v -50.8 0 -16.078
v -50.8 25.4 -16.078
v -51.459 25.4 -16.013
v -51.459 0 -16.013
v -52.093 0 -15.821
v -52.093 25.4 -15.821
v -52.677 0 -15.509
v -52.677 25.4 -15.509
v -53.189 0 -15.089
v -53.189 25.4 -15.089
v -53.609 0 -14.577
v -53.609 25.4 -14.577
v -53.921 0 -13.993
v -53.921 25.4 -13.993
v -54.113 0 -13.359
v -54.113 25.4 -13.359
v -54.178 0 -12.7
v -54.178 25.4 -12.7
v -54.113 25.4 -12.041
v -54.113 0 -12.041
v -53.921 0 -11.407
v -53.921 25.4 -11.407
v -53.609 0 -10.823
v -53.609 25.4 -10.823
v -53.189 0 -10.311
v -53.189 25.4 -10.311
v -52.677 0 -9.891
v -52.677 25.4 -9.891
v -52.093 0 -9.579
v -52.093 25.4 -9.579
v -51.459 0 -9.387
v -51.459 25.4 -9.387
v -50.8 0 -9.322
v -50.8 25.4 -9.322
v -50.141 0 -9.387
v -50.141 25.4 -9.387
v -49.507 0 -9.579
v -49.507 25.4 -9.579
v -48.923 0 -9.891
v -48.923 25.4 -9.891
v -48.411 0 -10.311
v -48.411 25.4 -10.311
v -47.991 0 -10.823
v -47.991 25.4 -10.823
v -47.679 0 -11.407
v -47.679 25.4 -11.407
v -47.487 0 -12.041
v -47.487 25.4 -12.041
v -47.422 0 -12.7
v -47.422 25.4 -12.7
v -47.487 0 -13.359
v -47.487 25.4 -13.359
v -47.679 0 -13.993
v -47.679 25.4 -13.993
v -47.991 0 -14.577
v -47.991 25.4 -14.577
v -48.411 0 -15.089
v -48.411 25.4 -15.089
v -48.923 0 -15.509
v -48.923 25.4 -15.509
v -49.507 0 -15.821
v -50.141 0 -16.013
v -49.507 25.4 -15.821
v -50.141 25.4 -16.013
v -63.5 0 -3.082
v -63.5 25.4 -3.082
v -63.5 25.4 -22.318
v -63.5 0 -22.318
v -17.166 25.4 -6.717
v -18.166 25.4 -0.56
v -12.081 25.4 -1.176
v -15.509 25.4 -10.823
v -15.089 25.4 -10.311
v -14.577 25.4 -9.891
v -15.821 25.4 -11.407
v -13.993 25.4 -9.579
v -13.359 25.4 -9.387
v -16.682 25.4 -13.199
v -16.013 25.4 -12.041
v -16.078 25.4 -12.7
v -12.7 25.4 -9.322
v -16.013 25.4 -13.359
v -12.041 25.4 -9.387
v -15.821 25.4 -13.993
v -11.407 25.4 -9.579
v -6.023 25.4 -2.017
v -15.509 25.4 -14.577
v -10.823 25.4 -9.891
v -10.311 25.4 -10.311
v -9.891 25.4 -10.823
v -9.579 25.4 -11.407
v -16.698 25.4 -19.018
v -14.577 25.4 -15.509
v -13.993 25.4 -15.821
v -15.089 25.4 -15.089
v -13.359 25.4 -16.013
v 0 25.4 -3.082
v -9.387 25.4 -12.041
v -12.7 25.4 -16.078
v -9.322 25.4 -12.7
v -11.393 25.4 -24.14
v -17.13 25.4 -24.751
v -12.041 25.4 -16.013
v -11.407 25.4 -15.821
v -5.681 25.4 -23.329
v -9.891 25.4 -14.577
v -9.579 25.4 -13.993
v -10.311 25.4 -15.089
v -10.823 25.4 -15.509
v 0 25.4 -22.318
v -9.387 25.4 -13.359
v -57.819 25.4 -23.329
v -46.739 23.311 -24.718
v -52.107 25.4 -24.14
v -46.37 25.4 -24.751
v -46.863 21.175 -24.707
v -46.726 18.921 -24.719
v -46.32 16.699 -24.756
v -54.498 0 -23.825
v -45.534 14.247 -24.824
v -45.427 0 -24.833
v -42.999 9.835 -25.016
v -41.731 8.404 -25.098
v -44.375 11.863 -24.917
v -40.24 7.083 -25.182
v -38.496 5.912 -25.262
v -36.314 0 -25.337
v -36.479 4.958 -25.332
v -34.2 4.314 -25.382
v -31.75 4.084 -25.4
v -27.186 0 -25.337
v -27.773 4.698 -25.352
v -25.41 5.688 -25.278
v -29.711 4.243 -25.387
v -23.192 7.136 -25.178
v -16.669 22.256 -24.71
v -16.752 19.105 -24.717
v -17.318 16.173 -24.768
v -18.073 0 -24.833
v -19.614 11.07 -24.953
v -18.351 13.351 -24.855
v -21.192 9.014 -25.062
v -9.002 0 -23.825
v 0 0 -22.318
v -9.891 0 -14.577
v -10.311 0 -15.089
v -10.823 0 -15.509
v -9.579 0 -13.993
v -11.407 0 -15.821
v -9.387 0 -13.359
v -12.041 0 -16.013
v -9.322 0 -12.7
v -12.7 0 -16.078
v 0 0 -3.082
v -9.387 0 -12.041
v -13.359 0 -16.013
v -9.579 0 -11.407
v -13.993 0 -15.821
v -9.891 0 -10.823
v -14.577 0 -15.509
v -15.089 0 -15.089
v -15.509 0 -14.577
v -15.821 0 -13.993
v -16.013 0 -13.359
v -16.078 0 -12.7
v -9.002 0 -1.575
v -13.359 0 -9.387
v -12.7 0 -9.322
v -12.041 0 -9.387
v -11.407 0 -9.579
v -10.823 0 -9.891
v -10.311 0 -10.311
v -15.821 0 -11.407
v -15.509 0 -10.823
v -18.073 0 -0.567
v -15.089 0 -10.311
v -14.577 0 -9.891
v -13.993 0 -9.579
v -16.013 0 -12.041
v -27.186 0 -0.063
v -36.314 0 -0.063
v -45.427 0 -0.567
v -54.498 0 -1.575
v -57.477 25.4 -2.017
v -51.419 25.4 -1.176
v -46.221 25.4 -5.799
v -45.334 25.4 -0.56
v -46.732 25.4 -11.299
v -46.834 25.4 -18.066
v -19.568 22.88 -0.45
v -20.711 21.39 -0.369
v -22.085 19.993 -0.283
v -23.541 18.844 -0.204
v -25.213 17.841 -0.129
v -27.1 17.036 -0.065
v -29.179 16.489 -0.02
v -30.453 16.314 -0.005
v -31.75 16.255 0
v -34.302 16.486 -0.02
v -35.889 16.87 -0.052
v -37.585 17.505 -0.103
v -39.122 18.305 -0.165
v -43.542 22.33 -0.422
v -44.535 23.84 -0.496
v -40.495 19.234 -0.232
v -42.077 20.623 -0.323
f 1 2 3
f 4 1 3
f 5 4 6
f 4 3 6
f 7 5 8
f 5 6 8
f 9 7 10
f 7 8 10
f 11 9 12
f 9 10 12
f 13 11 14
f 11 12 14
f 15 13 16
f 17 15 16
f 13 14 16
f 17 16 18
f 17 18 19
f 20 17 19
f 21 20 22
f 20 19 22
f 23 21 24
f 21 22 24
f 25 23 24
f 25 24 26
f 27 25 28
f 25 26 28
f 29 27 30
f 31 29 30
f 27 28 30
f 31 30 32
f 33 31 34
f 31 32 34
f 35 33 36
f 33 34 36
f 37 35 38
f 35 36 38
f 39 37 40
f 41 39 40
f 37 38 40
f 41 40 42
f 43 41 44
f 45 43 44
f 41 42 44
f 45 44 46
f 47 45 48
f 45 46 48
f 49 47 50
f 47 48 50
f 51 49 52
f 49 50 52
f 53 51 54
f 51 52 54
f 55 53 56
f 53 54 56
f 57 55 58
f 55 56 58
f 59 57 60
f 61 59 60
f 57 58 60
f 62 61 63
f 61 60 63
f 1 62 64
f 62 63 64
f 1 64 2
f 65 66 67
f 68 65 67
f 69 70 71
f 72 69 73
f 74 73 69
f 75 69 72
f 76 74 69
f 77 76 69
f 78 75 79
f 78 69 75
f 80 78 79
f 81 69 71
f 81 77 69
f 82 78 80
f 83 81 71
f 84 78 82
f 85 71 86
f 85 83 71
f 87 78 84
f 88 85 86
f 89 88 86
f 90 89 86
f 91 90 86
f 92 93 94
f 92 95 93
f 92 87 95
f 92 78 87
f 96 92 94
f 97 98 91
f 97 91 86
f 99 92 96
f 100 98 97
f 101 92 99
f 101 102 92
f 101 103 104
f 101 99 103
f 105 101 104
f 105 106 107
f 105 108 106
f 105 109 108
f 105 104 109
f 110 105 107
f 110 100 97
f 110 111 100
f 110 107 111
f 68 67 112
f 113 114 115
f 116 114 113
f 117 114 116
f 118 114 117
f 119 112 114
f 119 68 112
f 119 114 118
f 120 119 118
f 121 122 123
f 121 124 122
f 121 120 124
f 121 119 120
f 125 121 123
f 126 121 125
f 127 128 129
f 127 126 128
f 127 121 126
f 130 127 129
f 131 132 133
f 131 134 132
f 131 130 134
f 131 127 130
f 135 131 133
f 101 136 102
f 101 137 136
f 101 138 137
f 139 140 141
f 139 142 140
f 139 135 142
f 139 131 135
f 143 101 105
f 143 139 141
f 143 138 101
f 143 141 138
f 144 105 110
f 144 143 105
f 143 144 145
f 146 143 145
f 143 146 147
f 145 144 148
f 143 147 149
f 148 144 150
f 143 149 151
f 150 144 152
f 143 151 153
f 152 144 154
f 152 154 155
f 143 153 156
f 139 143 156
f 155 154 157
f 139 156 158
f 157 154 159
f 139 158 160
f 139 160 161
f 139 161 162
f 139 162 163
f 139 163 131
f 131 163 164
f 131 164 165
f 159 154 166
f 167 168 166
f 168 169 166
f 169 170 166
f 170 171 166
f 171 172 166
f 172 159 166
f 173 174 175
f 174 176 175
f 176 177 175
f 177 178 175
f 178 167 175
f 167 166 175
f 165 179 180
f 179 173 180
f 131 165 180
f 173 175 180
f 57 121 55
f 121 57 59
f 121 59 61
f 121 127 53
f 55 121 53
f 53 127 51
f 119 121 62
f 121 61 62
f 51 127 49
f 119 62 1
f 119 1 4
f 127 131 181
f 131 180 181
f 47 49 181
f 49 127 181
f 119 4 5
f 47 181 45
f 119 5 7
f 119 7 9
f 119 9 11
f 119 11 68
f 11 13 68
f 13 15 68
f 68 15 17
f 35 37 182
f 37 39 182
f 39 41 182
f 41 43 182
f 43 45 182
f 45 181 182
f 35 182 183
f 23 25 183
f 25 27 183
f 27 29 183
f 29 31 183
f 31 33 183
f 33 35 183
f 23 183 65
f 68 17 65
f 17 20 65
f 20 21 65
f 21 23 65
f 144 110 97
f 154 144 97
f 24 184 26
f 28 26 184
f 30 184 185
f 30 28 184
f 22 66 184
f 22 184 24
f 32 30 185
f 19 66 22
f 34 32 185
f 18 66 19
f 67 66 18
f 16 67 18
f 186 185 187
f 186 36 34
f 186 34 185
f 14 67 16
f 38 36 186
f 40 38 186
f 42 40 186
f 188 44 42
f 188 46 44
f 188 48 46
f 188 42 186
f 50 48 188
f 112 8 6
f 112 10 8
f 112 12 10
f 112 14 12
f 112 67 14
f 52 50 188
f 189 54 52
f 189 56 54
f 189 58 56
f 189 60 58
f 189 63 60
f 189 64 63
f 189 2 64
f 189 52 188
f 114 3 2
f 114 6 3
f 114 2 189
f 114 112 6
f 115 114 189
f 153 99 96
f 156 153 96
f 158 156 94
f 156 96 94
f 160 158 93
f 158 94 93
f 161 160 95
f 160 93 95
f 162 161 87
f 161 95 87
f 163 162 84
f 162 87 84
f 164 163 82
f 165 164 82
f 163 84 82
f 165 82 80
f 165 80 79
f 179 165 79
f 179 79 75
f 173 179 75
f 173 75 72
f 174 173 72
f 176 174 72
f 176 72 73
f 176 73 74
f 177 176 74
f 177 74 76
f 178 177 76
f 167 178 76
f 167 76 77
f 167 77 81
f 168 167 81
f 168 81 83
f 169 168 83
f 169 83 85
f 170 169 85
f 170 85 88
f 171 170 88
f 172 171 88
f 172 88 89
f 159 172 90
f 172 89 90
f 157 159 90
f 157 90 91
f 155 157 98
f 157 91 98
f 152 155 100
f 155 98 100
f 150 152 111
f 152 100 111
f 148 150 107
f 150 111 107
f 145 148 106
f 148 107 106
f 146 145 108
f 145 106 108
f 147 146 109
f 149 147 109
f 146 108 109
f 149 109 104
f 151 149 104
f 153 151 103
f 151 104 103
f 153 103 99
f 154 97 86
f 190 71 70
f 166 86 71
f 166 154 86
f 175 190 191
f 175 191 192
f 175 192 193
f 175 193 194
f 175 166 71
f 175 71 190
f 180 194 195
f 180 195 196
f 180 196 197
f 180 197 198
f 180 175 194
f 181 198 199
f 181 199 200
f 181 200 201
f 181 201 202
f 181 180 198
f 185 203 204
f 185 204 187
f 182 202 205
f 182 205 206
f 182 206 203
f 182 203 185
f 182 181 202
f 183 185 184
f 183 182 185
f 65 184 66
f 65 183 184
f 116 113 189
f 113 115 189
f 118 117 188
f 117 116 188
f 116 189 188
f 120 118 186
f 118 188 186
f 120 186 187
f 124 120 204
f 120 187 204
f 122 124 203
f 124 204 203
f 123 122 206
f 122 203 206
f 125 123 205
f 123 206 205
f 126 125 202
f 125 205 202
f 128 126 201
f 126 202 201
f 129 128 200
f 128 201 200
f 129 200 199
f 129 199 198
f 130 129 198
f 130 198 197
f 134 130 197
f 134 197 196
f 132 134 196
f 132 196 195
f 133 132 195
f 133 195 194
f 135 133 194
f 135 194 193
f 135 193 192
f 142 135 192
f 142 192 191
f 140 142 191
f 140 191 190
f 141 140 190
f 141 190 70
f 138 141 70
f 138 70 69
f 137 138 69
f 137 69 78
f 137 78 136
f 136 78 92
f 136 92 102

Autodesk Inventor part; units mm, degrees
ref_plane "YZ Plane" through (0, 0, 0) normal (1, 0, 0) x (0, 1, 0)
ref_plane "XZ Plane" through (0, 0, 0) normal (0, 1, 0) x (-1, 0, 0)
ref_plane "XY Plane" through (0, 0, 0) normal (0, 0, 1) x (1, 0, 0)
sketch "Sketch1" plane through (0, 0, 0) normal (0, 1, 0) x (-1, 0, 0)
  line L0 (0, 0) -> (63.5, 0)
  line L1 (63.5, 0) -> (63.5, -25.4)
  line L2 (63.5, -25.4) -> (0, -25.4)
  line L3 (0, -25.4) -> (0, 0)
  dimension "d0" = 63.5
  dimension "d1" = 25.4
extrude "Extrusion1" add sketch "Sketch1" along normal blind 26.1938
sketch "Sketch2" plane through (0, 0, 0) normal (0, -1, 0) x (1, 0, 0)
  line L0 (-63.5, 0) -> (0, 0) projected
  line L1 (-31.75, 0) -> (-31.75, -25.4) construction
  line L2 (0, -25.4) -> (-63.5, -25.4) projected
  circle A0 centre (-50.8, -12.7) radius 4.7004
  circle A1 centre (-12.7, -12.7) radius 4.7004
  dimension "d4" = 19.05
  dimension "d5" = 12.7
hole "Hole1" at (-12.7, 0, -12.7) at (-50.8, 0, -12.7) direction (0, 1, 0) diameter 6.7564 end through all clearance for "Flat Head Machine Screw (82)" size "1/4" standard "Ansi Unified Screw Threads"
ref_plane "Work Plane6" through (-63.5, 25.0611, -27.764) normal (0, -0.4321, -0.9018) x (-1, 0, 0)
ref_plane "Work Plane5" through (-63.5, 26.1938, -25.4) normal (0, -0.4321, -0.9018) x (-1, 0, 0)
sketch "Sketch10" plane through (-63.5, 25.0611, -27.764) normal (0, -0.4321, -0.9018) x (-1, 0, 0)
  circle A0 centre (-31.75, -4.826) radius 15.113
  line L0 (-63.5, 0) -> (0, 0) projected
  point P0 (-63.5, -34.5974)
  dimension "d50" = 30.226
  dimension "d51" = 4.826
extrude "Extrusion9" cut sketch "Sketch10" along normal mid plane 76.2
sketch "Sketch6" plane through (0, 0, 0) normal (0, -1, 0) x (1, 0, 0)
  line L0 (0, 0) -> (-63.5, 0) projected
  circle A0 centre (-31.75, -165.1) radius 165.1
  line L1 (-63.5, -25.4) -> (-63.5, 0) projected
  line L2 (-63.5, 0) -> (-63.5, -3.0816)
  line L3 (0, 0) -> (0, -3.0816)
  line L4 (0, 0) -> (0, -25.4) projected
  dimension "d28" = 330.2
  dimension "d29" = 165.1
extrude "Extrusion5" cut sketch "Sketch6" against normal blind 50.8 contours L3 A0 L0 | A0 L1 L0
sketch "Sketch7" plane through (0, 0, 0) normal (0, -1, 0) x (1, 0, 0)
  line L0 (-63.5, -25.4) -> (0, -25.4) construction
  line L1 (-31.75, -25.4) -> (-31.75, 139.7) construction
  line L2 (-31.75, -25.4) -> (133.35, -25.4) construction
  circle A0 centre (-31.75, 139.7) radius 165.1
  line L3 (0, 0) -> (0, -25.4) projected
  line L4 (0, -22.3184) -> (0, -25.4)
  line L5 (0, -25.4) -> (-63.5, -25.4)
  line L6 (-63.5, -25.4) -> (-63.5, -22.3184)
  line L7 (-63.5, -25.4) -> (-63.5, 0) projected
  point P0 (0, -3.0816)
  point P1 (-63.5, -3.0816)
  dimension "d32" = 165.1
  dimension "d33" = 90
extrude "Extrusion6" cut sketch "Sketch7" against normal blind 50.8 contours A0 L5 L6 | L3 L5 A0
sketch "Sketch11" plane through (0, 26.1938, 0) normal (0, 1, 0) x (1, 0, 0)
  line L0 (8.9616, -13.4203) -> (-66.3152, -13.4203)
  line L1 (-66.3152, -13.4203) -> (-66.3152, 46.0555)
  line L2 (-66.3152, 46.0555) -> (8.9616, 46.0555)
  line L3 (8.9616, 46.0555) -> (8.9616, -13.4203)
  point P0 (0, 0)
extrude "Extrusion10" cut sketch "Sketch11" against normal blind 0.7937
properties part number "wedgeBlock"
